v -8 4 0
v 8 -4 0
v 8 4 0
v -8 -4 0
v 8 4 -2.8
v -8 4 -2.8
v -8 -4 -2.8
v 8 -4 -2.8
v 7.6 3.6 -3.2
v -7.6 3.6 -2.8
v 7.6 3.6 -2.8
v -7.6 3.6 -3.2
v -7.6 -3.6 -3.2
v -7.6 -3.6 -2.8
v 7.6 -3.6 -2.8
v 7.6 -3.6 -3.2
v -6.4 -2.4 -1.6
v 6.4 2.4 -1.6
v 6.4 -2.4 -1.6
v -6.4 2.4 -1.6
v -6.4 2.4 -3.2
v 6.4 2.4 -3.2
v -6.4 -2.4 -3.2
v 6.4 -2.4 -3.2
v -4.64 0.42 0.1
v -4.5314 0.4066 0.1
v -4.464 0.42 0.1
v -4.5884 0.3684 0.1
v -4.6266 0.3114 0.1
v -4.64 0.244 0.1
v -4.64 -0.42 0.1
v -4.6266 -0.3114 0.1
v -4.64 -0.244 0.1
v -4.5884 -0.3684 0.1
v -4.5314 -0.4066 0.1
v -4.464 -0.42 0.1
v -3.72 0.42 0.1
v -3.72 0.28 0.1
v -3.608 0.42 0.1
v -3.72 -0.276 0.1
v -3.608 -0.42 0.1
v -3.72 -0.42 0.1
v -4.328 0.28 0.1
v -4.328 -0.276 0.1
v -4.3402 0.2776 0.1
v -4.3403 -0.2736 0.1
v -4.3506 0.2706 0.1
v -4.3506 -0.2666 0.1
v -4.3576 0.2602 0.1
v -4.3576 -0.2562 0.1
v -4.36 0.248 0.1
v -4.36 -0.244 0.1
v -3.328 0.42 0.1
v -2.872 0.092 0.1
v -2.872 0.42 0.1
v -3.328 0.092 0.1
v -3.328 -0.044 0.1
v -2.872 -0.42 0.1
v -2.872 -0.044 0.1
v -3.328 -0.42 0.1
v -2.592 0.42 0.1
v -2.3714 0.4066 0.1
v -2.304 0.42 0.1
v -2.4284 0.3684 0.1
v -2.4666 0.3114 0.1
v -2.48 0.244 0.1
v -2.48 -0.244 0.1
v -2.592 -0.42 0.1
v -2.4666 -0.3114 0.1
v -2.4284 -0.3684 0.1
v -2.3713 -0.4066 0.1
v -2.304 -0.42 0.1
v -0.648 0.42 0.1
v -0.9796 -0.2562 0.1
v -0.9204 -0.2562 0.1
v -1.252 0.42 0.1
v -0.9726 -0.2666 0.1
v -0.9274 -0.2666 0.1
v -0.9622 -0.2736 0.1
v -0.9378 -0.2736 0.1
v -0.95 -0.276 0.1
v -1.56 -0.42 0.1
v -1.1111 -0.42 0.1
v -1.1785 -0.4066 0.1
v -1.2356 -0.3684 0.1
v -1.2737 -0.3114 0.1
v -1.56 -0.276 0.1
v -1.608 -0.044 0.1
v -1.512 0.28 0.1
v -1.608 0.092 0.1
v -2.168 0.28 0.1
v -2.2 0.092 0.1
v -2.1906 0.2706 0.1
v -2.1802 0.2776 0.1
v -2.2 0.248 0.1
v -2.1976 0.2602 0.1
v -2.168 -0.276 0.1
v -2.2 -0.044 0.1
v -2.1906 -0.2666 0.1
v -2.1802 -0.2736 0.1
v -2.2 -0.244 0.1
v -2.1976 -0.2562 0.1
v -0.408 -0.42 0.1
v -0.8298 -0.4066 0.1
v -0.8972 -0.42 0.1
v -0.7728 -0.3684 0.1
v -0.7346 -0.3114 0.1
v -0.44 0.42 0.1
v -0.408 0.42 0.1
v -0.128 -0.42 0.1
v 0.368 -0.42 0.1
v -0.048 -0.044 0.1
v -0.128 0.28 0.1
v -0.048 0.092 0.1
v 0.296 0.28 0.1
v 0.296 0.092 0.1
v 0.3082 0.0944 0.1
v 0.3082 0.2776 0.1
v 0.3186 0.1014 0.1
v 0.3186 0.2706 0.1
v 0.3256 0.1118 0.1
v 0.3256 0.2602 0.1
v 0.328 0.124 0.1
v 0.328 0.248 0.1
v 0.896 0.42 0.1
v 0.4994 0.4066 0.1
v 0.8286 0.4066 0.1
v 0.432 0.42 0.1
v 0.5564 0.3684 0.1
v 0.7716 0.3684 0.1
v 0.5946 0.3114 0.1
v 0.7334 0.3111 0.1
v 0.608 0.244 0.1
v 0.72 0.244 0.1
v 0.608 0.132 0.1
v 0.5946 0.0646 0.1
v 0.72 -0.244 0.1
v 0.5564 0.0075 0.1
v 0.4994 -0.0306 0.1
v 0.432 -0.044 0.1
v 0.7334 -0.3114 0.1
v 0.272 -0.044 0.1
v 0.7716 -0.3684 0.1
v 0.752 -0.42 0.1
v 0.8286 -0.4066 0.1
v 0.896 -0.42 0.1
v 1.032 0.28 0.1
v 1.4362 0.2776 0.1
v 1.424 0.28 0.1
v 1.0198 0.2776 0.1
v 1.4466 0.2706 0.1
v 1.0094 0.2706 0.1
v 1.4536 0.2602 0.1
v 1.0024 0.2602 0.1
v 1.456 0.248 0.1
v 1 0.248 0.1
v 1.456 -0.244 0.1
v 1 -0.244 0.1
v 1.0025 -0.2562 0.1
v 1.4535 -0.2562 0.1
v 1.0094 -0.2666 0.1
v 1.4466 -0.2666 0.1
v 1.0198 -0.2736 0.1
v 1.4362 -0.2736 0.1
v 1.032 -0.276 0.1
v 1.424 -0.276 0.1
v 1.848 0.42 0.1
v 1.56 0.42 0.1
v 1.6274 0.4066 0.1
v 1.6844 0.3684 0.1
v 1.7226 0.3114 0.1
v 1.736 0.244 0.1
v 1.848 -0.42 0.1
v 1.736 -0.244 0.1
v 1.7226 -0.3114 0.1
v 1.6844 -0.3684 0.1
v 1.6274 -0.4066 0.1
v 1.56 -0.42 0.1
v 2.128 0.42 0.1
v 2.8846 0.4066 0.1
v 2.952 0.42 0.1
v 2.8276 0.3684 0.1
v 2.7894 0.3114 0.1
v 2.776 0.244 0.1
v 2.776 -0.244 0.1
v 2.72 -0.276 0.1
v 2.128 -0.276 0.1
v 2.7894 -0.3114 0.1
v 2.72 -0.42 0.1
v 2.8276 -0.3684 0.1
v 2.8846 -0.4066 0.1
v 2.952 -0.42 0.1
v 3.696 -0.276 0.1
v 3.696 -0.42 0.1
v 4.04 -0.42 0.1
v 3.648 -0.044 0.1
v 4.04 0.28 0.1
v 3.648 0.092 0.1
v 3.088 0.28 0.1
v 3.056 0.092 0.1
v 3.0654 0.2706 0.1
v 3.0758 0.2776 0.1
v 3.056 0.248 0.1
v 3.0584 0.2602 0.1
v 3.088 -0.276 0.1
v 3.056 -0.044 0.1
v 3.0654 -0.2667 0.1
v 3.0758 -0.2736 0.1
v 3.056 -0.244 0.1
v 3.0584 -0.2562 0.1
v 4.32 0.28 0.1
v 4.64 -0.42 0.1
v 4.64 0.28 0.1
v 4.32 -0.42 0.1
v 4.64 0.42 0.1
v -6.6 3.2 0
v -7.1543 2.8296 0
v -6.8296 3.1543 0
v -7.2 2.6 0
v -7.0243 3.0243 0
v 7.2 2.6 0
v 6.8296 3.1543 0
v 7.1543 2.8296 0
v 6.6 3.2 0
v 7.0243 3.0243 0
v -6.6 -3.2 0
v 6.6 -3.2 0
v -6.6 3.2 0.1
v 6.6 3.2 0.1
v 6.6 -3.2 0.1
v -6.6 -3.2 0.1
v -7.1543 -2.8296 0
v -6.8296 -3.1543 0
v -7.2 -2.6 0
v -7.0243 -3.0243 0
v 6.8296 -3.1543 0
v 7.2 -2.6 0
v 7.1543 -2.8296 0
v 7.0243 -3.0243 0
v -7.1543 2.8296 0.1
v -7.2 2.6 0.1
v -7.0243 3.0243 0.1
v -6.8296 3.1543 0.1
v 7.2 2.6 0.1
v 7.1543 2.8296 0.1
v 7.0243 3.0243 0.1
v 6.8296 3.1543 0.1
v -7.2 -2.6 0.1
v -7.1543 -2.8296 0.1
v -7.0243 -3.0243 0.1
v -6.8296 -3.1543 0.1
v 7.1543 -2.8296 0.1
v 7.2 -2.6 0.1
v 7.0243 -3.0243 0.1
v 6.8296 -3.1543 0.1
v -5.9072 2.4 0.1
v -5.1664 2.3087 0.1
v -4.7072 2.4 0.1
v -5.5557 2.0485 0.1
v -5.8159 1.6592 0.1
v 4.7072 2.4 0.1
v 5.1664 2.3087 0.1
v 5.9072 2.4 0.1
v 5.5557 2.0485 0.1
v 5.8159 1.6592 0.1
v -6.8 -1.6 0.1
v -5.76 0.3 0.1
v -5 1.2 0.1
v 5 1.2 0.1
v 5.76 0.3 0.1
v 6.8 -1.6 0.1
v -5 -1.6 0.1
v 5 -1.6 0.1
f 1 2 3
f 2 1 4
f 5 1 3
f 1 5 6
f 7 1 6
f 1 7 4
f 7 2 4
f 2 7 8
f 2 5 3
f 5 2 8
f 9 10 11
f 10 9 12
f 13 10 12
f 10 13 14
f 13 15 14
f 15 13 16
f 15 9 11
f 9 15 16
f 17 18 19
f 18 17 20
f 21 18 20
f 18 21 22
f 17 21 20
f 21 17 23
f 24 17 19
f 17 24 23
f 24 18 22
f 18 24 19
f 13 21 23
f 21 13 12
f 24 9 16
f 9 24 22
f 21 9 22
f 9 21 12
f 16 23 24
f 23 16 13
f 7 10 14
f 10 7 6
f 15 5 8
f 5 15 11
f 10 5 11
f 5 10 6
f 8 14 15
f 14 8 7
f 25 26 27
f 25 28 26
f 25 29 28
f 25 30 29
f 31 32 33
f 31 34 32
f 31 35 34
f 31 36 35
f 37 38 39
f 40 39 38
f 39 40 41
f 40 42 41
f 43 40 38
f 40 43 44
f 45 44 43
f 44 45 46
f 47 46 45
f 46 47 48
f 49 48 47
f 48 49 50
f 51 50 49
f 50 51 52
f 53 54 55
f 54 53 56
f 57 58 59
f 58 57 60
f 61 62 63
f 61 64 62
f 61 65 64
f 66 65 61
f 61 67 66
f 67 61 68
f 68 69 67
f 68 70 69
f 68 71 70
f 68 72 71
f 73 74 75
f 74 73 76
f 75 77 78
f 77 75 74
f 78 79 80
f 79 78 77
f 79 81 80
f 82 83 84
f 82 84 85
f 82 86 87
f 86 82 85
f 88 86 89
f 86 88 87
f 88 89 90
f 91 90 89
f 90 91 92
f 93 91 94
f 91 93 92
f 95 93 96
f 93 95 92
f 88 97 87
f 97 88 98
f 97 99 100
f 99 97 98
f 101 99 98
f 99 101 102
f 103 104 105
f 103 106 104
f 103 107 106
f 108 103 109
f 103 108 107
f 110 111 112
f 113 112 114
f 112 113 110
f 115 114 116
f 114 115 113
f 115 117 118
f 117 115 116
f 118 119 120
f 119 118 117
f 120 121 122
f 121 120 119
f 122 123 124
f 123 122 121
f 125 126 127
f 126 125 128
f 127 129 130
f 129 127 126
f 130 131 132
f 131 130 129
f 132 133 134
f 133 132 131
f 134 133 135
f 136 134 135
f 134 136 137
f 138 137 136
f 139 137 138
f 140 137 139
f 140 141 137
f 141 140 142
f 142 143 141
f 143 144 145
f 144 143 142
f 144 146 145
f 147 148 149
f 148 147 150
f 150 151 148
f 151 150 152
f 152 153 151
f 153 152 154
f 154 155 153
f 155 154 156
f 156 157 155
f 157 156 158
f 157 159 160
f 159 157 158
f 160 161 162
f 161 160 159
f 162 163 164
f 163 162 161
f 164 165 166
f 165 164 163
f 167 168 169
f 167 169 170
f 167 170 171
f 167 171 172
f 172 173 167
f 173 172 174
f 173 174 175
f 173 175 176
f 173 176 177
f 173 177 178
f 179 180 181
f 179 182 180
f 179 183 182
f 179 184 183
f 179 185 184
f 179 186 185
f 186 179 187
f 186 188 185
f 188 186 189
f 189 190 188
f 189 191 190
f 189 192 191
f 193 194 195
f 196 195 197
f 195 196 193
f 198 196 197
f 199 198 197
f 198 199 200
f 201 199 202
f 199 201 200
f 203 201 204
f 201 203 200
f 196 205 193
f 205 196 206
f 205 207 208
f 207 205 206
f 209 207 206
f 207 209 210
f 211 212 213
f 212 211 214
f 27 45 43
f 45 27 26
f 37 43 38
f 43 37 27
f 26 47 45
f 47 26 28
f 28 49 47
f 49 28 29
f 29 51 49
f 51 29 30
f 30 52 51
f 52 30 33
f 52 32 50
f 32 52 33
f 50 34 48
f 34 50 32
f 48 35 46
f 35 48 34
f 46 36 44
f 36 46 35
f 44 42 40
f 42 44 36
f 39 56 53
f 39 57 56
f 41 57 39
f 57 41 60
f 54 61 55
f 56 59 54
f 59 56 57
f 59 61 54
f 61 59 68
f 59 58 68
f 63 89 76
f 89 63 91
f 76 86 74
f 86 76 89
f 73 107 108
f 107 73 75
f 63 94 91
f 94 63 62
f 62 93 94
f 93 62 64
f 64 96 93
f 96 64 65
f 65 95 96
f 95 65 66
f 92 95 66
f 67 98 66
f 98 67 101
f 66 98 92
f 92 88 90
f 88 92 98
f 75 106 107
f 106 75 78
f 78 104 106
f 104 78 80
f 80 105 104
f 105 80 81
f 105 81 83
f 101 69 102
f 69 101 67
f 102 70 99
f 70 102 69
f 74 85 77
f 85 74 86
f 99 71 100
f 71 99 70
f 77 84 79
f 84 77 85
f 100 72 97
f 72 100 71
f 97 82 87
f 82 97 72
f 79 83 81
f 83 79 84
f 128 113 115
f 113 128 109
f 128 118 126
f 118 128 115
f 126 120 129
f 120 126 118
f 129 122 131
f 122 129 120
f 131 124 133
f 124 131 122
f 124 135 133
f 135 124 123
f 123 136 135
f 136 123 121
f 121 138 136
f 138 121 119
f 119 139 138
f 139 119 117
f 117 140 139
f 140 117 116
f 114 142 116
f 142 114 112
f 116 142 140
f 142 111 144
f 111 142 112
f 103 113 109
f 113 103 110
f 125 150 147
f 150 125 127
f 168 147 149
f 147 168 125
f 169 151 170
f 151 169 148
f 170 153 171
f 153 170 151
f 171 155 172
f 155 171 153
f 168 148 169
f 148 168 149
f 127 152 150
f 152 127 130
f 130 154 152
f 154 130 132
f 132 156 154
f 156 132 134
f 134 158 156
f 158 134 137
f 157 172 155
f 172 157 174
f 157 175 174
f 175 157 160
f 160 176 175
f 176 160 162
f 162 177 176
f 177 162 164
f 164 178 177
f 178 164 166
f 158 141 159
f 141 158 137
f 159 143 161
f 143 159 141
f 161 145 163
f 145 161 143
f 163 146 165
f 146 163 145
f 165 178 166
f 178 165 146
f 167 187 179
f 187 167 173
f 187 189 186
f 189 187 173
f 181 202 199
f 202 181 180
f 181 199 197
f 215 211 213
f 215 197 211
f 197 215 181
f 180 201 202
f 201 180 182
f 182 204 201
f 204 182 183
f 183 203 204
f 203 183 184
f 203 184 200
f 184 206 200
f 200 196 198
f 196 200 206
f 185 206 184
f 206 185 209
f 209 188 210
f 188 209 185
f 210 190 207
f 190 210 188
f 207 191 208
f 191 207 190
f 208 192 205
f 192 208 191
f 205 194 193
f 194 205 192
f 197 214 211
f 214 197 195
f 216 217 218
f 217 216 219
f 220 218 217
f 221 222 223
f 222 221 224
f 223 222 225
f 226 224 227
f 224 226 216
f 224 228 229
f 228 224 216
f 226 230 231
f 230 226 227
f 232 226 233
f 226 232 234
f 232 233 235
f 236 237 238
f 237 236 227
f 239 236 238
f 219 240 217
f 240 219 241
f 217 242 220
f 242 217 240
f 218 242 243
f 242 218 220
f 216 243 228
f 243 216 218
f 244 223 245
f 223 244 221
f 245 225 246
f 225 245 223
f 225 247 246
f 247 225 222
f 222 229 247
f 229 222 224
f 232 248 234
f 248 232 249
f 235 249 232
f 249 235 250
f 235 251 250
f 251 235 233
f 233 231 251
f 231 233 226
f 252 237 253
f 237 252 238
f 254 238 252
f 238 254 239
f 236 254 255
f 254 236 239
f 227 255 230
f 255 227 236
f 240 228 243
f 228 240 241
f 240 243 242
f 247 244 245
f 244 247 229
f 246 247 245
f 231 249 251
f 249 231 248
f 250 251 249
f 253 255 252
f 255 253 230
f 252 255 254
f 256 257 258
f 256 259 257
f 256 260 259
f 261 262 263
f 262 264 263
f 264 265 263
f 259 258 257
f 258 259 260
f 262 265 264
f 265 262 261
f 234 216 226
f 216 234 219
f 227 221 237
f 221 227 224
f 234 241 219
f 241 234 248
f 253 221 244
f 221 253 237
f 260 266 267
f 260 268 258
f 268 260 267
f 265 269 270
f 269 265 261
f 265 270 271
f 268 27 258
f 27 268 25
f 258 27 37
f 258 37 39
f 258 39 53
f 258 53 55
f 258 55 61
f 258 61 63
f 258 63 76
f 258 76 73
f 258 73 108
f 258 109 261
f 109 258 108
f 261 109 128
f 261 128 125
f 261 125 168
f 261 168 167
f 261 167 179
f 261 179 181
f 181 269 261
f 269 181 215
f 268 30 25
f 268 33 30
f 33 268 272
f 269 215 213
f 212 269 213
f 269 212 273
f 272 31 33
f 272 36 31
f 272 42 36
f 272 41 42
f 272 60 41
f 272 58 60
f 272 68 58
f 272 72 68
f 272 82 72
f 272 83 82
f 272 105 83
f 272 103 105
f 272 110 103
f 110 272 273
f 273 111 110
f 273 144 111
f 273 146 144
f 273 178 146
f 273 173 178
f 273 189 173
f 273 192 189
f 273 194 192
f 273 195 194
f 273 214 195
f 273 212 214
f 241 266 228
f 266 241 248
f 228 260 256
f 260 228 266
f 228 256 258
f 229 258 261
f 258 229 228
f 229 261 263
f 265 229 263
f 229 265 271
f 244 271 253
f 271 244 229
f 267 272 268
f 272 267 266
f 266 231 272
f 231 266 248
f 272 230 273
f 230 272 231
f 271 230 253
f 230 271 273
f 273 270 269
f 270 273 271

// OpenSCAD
use <../lib.scad>
use <3069b.scad>
use <6142617r.scad>
function ldraw_lib__3069bd2z() = [
// 0 Tile  1 x  2 with Silver "Chevrolet" in Black Frame on Red Background Sticker
// 0 Name: 3069bd2z.dat
// 0 Author: Alfred Schmitz [AlfredS]
// 0 !LDRAW_ORG Shortcut UPDATE 2026-09
// 0 !LICENSE Licensed under CC BY 4.0 : see CAreadme.txt
// 
// 0 BFC CERTIFY CCW
  [0,"BFC","CERTIFY"],
  [0,"BFC","CCW"],
// 
// 0 !CATEGORY Sticker Shortcut
// 0 !KEYWORDS Camaro, Chevrolet, Drag, Race, Set 75874, Speed Champions
// 
// 0 !HISTORY 2026-09-30 [OrionP] Official Update 2026-09
// 
// 1 16 0 0 0 1 0 0 0 1 0 0 0 1 3069b.dat
  [1,16,0,0,0,1,0,0,0,1,0,0,0,1, ldraw_lib__3069b()],
// 1 16 0 0 0 1 0 0 0 1 0 0 0 1 6142617r.dat
  [1,16,0,0,0,1,0,0,0,1,0,0,0,1, ldraw_lib__6142617r()],
];
module ldraw_lib__3069bd2z(step=0, col=false, unit=2/5, alt=false, line=0.2, solid=!$preview)
    makepoly(ldraw_lib__3069bd2z(), step=step, col=col, unit=unit, alt=alt, line=line, solid=solid);
ldraw_lib__3069bd2z(line=0.2);
